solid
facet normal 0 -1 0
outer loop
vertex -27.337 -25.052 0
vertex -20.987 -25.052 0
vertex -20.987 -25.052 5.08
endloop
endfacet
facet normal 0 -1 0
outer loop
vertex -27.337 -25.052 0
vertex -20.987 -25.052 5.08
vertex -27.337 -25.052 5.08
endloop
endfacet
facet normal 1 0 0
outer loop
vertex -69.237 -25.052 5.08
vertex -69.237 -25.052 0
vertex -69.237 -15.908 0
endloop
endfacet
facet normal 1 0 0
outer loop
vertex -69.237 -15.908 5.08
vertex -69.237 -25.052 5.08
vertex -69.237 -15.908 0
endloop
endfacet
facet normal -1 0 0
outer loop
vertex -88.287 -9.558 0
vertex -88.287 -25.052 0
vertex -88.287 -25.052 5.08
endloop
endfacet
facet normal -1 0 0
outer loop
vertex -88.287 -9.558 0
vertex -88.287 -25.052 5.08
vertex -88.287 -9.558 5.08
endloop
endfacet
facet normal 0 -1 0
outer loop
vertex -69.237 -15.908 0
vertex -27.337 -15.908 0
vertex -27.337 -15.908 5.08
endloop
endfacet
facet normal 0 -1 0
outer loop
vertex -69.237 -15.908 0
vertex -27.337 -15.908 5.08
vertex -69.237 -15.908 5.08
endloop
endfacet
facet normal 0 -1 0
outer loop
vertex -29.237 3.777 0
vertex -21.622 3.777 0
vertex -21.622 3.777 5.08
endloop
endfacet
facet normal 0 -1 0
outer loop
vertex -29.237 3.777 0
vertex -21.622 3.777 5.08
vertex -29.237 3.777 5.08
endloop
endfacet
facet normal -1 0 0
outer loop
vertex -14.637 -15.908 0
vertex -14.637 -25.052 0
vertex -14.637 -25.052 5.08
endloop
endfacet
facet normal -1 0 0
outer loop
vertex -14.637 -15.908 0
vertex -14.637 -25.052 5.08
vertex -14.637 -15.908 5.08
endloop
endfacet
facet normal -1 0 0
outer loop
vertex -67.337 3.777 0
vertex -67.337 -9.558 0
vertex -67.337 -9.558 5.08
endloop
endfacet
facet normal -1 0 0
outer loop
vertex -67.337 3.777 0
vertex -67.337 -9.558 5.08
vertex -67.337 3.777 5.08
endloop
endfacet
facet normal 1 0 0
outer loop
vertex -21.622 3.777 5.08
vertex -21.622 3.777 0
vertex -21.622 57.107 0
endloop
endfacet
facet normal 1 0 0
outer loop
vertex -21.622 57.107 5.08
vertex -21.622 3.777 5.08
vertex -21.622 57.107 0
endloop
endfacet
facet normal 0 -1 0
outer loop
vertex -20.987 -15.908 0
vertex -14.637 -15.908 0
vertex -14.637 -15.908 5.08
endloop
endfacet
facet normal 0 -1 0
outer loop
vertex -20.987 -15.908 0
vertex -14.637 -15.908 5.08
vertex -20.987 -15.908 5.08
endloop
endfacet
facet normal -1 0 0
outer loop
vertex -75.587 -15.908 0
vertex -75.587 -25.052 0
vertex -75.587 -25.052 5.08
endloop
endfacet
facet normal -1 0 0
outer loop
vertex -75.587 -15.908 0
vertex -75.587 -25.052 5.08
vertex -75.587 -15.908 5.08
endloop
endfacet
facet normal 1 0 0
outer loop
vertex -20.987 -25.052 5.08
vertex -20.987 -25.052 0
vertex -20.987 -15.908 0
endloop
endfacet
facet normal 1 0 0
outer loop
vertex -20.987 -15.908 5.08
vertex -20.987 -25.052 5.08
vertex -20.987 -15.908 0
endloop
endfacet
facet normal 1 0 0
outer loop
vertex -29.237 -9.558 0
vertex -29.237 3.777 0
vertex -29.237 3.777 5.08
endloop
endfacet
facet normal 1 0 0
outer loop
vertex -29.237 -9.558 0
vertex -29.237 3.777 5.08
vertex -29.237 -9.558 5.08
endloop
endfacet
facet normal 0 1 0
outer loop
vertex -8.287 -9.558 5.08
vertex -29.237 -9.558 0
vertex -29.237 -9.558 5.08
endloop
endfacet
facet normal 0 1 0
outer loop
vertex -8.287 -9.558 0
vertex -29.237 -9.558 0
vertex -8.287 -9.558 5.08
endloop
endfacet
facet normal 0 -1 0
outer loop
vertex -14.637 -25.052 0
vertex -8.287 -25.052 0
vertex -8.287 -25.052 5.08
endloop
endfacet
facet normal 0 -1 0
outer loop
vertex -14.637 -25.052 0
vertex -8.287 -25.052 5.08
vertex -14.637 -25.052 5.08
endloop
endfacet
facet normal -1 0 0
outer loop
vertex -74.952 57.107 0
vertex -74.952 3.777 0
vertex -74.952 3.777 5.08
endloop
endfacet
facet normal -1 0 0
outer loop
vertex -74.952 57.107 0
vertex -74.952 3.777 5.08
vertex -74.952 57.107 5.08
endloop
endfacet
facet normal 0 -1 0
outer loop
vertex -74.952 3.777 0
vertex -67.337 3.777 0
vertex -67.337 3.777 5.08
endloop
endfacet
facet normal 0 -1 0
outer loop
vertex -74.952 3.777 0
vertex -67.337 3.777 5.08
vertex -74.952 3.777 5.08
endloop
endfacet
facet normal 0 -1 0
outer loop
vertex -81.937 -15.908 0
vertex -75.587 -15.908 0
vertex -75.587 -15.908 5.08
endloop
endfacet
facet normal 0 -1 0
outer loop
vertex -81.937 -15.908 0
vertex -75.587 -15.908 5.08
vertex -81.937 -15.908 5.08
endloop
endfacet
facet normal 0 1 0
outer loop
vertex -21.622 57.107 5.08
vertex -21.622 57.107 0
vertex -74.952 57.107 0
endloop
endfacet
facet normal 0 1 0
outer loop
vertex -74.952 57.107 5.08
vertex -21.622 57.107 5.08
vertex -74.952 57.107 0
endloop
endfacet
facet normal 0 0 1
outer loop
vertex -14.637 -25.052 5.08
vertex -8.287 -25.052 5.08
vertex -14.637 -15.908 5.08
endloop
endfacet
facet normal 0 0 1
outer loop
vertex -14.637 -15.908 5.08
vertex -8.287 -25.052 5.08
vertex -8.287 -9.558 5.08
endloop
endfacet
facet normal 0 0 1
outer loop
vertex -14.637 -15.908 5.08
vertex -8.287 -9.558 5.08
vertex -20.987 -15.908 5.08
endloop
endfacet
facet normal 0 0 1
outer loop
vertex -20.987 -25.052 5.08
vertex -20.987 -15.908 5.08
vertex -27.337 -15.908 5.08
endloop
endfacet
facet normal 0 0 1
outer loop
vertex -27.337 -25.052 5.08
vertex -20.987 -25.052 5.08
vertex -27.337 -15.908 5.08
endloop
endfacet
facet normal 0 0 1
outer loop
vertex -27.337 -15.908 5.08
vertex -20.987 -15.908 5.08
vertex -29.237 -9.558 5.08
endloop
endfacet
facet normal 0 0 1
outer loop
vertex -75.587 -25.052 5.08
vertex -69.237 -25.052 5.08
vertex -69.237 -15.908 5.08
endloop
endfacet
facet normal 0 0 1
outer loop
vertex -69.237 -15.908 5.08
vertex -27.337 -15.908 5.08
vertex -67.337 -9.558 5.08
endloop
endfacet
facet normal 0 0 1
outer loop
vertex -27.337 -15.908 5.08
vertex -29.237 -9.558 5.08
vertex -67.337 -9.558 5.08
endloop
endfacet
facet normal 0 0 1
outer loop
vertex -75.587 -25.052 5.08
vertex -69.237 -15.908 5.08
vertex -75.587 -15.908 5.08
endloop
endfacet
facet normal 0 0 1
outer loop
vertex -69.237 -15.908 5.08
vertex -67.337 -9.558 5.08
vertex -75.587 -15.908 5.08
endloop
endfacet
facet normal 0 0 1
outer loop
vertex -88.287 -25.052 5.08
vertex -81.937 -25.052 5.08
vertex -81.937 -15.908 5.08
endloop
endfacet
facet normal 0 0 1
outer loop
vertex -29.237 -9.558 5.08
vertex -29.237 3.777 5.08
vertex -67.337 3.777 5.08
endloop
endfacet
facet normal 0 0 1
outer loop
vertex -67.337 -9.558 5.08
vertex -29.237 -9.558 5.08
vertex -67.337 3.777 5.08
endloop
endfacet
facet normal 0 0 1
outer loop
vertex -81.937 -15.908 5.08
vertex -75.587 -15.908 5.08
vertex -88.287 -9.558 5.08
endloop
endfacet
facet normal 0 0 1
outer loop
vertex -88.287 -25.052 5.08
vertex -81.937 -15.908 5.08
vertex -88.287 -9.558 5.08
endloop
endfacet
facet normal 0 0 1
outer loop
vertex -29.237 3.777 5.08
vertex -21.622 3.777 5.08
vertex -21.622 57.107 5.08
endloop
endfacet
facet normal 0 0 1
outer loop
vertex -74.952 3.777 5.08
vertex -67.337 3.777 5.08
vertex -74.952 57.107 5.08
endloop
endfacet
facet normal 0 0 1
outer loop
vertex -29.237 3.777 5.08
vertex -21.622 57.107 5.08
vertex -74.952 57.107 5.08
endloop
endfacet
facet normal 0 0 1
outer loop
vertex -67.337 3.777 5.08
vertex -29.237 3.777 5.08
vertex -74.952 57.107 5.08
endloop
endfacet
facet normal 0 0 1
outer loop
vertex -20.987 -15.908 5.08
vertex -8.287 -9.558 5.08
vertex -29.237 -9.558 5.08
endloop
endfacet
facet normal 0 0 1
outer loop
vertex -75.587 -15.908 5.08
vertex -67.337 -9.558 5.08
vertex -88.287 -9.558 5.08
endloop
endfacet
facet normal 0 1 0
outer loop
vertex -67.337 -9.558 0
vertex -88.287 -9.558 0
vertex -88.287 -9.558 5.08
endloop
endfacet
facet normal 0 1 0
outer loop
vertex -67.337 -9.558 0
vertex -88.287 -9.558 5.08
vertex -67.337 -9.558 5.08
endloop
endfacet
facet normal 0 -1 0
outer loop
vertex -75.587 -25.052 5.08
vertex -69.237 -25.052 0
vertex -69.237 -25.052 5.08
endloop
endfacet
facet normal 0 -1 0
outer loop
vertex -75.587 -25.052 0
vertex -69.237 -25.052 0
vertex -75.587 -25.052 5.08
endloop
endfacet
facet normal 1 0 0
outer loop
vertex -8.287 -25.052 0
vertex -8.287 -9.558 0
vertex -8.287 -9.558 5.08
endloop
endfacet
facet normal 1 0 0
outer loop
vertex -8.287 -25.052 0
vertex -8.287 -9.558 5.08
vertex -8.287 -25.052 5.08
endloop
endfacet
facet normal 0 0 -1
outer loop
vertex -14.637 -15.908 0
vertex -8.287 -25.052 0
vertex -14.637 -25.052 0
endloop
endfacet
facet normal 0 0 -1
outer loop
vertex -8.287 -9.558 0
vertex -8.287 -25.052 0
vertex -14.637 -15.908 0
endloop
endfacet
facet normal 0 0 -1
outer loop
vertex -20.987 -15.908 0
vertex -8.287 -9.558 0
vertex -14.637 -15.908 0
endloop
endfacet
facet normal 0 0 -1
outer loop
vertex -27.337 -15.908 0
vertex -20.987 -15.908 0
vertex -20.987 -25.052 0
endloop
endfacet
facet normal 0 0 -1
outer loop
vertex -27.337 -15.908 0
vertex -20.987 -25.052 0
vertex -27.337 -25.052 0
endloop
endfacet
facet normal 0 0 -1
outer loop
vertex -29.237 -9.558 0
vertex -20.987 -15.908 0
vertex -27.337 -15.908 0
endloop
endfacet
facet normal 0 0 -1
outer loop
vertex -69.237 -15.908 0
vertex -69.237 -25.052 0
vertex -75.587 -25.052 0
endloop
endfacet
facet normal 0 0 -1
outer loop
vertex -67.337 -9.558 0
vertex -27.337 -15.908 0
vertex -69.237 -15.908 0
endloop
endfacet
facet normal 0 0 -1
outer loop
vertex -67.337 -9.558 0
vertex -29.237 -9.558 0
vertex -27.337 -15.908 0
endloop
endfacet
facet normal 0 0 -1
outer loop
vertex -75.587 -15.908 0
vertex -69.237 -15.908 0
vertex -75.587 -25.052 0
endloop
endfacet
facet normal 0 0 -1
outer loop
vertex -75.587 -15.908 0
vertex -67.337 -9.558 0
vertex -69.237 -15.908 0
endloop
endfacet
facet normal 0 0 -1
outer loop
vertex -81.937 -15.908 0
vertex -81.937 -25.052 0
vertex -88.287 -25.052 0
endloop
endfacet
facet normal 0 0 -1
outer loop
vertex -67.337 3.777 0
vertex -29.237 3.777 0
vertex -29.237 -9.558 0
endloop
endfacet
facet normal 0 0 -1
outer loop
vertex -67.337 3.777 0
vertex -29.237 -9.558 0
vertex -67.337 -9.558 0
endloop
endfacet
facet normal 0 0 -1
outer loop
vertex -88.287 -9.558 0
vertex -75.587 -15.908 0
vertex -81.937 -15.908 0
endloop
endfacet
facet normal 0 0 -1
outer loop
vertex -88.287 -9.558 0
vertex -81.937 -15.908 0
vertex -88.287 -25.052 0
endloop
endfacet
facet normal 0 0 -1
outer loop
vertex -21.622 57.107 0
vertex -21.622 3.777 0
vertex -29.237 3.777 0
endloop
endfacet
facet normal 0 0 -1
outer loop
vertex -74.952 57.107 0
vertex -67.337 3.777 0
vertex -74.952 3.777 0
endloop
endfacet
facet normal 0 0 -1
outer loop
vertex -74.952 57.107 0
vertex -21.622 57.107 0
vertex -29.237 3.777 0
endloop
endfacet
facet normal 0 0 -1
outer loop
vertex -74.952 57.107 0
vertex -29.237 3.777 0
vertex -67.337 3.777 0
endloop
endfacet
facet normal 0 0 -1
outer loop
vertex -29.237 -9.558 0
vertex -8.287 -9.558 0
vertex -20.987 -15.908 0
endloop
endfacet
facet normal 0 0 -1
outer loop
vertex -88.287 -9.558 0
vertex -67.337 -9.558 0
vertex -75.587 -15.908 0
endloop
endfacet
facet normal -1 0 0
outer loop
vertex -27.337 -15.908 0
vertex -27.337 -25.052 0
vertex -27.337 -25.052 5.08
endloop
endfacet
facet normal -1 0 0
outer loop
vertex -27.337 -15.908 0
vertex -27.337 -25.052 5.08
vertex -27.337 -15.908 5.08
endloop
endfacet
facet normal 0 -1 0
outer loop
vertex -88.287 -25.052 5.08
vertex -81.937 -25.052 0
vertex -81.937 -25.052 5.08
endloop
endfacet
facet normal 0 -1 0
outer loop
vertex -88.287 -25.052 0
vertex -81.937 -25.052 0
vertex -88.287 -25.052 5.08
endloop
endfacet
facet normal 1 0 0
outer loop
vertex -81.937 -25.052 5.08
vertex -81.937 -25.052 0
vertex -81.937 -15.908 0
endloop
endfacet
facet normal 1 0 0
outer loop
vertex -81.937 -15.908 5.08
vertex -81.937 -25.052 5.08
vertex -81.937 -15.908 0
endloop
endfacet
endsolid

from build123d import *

# Parameters (mm, degrees)
BOSS_EXTRUDE1_DEPTH = 5.08
SKETCH2_W           = 6.35
SKETCH2_H           = 9.144
BOSS_EXTRUDE2_DEPTH = 5.08
SKETCH3_W           = 53.33
SKETCH3_H           = 53.33
MARKERBACK_DEPTH    = 5.08
SKETCH4_W           = 29.19984
SKETCH4_H           = 9.144
CUT_EXTRUDE1_DEPTH  = 5.08


with BuildPart() as part:
    # Sketch1 → Boss-Extrude1 (new body)
    with BuildSketch(Plane.XY):
        Polygon((-67.336947791, 30.441767068), (-29.236947791, 30.441767068), (-29.236947791, -9.558232932), (-8.287027791, -9.558232932), (-8.287027791, -15.908232932), (-88.286867791, -15.908232932), (-88.286867791, -9.558232932), (-67.336947791, -9.558232932), align=None)
    extrude(amount=BOSS_EXTRUDE1_DEPTH)

    # Sketch2 → Boss-Extrude2 (add)
    with BuildSketch(Plane(origin=(0, 0, 0), x_dir=(-1, 0, 0), z_dir=(0, 0, -1))):
        with Locations((85.111867791, -20.480232932)):
            Rectangle(SKETCH2_W, SKETCH2_H)
        with Locations((72.411867791, -20.480232932)):
            Rectangle(SKETCH2_W, SKETCH2_H)
        with Locations((11.462027791, -20.480232932)):
            Rectangle(SKETCH2_W, SKETCH2_H)
        with Locations((24.162027791, -20.480232932)):
            Rectangle(SKETCH2_W, SKETCH2_H)
        with Locations((59.711867791, -20.480232932)):
            Rectangle(SKETCH2_W, SKETCH2_H)
        with Locations((36.862027791, -20.480232932)):
            Rectangle(SKETCH2_W, SKETCH2_H)
    extrude(amount=-BOSS_EXTRUDE2_DEPTH)

    # Sketch3 → markerBack (add)
    with BuildSketch(Plane(origin=(0, 0, 0), x_dir=(-1, 0, 0), z_dir=(0, 0, -1))):
        with Locations((48.286947791, 30.441767068)):
            Rectangle(SKETCH3_W, SKETCH3_H)
    extrude(amount=-MARKERBACK_DEPTH)

    # Sketch4 → Cut-Extrude1 (cut)
    with BuildSketch(Plane.XY.offset(5.08)):
        with Locations((-48.286947791, -20.480232932)):
            Rectangle(SKETCH4_W, SKETCH4_H)
    extrude(amount=-CUT_EXTRUDE1_DEPTH, mode=Mode.SUBTRACT)


solid = part.part
